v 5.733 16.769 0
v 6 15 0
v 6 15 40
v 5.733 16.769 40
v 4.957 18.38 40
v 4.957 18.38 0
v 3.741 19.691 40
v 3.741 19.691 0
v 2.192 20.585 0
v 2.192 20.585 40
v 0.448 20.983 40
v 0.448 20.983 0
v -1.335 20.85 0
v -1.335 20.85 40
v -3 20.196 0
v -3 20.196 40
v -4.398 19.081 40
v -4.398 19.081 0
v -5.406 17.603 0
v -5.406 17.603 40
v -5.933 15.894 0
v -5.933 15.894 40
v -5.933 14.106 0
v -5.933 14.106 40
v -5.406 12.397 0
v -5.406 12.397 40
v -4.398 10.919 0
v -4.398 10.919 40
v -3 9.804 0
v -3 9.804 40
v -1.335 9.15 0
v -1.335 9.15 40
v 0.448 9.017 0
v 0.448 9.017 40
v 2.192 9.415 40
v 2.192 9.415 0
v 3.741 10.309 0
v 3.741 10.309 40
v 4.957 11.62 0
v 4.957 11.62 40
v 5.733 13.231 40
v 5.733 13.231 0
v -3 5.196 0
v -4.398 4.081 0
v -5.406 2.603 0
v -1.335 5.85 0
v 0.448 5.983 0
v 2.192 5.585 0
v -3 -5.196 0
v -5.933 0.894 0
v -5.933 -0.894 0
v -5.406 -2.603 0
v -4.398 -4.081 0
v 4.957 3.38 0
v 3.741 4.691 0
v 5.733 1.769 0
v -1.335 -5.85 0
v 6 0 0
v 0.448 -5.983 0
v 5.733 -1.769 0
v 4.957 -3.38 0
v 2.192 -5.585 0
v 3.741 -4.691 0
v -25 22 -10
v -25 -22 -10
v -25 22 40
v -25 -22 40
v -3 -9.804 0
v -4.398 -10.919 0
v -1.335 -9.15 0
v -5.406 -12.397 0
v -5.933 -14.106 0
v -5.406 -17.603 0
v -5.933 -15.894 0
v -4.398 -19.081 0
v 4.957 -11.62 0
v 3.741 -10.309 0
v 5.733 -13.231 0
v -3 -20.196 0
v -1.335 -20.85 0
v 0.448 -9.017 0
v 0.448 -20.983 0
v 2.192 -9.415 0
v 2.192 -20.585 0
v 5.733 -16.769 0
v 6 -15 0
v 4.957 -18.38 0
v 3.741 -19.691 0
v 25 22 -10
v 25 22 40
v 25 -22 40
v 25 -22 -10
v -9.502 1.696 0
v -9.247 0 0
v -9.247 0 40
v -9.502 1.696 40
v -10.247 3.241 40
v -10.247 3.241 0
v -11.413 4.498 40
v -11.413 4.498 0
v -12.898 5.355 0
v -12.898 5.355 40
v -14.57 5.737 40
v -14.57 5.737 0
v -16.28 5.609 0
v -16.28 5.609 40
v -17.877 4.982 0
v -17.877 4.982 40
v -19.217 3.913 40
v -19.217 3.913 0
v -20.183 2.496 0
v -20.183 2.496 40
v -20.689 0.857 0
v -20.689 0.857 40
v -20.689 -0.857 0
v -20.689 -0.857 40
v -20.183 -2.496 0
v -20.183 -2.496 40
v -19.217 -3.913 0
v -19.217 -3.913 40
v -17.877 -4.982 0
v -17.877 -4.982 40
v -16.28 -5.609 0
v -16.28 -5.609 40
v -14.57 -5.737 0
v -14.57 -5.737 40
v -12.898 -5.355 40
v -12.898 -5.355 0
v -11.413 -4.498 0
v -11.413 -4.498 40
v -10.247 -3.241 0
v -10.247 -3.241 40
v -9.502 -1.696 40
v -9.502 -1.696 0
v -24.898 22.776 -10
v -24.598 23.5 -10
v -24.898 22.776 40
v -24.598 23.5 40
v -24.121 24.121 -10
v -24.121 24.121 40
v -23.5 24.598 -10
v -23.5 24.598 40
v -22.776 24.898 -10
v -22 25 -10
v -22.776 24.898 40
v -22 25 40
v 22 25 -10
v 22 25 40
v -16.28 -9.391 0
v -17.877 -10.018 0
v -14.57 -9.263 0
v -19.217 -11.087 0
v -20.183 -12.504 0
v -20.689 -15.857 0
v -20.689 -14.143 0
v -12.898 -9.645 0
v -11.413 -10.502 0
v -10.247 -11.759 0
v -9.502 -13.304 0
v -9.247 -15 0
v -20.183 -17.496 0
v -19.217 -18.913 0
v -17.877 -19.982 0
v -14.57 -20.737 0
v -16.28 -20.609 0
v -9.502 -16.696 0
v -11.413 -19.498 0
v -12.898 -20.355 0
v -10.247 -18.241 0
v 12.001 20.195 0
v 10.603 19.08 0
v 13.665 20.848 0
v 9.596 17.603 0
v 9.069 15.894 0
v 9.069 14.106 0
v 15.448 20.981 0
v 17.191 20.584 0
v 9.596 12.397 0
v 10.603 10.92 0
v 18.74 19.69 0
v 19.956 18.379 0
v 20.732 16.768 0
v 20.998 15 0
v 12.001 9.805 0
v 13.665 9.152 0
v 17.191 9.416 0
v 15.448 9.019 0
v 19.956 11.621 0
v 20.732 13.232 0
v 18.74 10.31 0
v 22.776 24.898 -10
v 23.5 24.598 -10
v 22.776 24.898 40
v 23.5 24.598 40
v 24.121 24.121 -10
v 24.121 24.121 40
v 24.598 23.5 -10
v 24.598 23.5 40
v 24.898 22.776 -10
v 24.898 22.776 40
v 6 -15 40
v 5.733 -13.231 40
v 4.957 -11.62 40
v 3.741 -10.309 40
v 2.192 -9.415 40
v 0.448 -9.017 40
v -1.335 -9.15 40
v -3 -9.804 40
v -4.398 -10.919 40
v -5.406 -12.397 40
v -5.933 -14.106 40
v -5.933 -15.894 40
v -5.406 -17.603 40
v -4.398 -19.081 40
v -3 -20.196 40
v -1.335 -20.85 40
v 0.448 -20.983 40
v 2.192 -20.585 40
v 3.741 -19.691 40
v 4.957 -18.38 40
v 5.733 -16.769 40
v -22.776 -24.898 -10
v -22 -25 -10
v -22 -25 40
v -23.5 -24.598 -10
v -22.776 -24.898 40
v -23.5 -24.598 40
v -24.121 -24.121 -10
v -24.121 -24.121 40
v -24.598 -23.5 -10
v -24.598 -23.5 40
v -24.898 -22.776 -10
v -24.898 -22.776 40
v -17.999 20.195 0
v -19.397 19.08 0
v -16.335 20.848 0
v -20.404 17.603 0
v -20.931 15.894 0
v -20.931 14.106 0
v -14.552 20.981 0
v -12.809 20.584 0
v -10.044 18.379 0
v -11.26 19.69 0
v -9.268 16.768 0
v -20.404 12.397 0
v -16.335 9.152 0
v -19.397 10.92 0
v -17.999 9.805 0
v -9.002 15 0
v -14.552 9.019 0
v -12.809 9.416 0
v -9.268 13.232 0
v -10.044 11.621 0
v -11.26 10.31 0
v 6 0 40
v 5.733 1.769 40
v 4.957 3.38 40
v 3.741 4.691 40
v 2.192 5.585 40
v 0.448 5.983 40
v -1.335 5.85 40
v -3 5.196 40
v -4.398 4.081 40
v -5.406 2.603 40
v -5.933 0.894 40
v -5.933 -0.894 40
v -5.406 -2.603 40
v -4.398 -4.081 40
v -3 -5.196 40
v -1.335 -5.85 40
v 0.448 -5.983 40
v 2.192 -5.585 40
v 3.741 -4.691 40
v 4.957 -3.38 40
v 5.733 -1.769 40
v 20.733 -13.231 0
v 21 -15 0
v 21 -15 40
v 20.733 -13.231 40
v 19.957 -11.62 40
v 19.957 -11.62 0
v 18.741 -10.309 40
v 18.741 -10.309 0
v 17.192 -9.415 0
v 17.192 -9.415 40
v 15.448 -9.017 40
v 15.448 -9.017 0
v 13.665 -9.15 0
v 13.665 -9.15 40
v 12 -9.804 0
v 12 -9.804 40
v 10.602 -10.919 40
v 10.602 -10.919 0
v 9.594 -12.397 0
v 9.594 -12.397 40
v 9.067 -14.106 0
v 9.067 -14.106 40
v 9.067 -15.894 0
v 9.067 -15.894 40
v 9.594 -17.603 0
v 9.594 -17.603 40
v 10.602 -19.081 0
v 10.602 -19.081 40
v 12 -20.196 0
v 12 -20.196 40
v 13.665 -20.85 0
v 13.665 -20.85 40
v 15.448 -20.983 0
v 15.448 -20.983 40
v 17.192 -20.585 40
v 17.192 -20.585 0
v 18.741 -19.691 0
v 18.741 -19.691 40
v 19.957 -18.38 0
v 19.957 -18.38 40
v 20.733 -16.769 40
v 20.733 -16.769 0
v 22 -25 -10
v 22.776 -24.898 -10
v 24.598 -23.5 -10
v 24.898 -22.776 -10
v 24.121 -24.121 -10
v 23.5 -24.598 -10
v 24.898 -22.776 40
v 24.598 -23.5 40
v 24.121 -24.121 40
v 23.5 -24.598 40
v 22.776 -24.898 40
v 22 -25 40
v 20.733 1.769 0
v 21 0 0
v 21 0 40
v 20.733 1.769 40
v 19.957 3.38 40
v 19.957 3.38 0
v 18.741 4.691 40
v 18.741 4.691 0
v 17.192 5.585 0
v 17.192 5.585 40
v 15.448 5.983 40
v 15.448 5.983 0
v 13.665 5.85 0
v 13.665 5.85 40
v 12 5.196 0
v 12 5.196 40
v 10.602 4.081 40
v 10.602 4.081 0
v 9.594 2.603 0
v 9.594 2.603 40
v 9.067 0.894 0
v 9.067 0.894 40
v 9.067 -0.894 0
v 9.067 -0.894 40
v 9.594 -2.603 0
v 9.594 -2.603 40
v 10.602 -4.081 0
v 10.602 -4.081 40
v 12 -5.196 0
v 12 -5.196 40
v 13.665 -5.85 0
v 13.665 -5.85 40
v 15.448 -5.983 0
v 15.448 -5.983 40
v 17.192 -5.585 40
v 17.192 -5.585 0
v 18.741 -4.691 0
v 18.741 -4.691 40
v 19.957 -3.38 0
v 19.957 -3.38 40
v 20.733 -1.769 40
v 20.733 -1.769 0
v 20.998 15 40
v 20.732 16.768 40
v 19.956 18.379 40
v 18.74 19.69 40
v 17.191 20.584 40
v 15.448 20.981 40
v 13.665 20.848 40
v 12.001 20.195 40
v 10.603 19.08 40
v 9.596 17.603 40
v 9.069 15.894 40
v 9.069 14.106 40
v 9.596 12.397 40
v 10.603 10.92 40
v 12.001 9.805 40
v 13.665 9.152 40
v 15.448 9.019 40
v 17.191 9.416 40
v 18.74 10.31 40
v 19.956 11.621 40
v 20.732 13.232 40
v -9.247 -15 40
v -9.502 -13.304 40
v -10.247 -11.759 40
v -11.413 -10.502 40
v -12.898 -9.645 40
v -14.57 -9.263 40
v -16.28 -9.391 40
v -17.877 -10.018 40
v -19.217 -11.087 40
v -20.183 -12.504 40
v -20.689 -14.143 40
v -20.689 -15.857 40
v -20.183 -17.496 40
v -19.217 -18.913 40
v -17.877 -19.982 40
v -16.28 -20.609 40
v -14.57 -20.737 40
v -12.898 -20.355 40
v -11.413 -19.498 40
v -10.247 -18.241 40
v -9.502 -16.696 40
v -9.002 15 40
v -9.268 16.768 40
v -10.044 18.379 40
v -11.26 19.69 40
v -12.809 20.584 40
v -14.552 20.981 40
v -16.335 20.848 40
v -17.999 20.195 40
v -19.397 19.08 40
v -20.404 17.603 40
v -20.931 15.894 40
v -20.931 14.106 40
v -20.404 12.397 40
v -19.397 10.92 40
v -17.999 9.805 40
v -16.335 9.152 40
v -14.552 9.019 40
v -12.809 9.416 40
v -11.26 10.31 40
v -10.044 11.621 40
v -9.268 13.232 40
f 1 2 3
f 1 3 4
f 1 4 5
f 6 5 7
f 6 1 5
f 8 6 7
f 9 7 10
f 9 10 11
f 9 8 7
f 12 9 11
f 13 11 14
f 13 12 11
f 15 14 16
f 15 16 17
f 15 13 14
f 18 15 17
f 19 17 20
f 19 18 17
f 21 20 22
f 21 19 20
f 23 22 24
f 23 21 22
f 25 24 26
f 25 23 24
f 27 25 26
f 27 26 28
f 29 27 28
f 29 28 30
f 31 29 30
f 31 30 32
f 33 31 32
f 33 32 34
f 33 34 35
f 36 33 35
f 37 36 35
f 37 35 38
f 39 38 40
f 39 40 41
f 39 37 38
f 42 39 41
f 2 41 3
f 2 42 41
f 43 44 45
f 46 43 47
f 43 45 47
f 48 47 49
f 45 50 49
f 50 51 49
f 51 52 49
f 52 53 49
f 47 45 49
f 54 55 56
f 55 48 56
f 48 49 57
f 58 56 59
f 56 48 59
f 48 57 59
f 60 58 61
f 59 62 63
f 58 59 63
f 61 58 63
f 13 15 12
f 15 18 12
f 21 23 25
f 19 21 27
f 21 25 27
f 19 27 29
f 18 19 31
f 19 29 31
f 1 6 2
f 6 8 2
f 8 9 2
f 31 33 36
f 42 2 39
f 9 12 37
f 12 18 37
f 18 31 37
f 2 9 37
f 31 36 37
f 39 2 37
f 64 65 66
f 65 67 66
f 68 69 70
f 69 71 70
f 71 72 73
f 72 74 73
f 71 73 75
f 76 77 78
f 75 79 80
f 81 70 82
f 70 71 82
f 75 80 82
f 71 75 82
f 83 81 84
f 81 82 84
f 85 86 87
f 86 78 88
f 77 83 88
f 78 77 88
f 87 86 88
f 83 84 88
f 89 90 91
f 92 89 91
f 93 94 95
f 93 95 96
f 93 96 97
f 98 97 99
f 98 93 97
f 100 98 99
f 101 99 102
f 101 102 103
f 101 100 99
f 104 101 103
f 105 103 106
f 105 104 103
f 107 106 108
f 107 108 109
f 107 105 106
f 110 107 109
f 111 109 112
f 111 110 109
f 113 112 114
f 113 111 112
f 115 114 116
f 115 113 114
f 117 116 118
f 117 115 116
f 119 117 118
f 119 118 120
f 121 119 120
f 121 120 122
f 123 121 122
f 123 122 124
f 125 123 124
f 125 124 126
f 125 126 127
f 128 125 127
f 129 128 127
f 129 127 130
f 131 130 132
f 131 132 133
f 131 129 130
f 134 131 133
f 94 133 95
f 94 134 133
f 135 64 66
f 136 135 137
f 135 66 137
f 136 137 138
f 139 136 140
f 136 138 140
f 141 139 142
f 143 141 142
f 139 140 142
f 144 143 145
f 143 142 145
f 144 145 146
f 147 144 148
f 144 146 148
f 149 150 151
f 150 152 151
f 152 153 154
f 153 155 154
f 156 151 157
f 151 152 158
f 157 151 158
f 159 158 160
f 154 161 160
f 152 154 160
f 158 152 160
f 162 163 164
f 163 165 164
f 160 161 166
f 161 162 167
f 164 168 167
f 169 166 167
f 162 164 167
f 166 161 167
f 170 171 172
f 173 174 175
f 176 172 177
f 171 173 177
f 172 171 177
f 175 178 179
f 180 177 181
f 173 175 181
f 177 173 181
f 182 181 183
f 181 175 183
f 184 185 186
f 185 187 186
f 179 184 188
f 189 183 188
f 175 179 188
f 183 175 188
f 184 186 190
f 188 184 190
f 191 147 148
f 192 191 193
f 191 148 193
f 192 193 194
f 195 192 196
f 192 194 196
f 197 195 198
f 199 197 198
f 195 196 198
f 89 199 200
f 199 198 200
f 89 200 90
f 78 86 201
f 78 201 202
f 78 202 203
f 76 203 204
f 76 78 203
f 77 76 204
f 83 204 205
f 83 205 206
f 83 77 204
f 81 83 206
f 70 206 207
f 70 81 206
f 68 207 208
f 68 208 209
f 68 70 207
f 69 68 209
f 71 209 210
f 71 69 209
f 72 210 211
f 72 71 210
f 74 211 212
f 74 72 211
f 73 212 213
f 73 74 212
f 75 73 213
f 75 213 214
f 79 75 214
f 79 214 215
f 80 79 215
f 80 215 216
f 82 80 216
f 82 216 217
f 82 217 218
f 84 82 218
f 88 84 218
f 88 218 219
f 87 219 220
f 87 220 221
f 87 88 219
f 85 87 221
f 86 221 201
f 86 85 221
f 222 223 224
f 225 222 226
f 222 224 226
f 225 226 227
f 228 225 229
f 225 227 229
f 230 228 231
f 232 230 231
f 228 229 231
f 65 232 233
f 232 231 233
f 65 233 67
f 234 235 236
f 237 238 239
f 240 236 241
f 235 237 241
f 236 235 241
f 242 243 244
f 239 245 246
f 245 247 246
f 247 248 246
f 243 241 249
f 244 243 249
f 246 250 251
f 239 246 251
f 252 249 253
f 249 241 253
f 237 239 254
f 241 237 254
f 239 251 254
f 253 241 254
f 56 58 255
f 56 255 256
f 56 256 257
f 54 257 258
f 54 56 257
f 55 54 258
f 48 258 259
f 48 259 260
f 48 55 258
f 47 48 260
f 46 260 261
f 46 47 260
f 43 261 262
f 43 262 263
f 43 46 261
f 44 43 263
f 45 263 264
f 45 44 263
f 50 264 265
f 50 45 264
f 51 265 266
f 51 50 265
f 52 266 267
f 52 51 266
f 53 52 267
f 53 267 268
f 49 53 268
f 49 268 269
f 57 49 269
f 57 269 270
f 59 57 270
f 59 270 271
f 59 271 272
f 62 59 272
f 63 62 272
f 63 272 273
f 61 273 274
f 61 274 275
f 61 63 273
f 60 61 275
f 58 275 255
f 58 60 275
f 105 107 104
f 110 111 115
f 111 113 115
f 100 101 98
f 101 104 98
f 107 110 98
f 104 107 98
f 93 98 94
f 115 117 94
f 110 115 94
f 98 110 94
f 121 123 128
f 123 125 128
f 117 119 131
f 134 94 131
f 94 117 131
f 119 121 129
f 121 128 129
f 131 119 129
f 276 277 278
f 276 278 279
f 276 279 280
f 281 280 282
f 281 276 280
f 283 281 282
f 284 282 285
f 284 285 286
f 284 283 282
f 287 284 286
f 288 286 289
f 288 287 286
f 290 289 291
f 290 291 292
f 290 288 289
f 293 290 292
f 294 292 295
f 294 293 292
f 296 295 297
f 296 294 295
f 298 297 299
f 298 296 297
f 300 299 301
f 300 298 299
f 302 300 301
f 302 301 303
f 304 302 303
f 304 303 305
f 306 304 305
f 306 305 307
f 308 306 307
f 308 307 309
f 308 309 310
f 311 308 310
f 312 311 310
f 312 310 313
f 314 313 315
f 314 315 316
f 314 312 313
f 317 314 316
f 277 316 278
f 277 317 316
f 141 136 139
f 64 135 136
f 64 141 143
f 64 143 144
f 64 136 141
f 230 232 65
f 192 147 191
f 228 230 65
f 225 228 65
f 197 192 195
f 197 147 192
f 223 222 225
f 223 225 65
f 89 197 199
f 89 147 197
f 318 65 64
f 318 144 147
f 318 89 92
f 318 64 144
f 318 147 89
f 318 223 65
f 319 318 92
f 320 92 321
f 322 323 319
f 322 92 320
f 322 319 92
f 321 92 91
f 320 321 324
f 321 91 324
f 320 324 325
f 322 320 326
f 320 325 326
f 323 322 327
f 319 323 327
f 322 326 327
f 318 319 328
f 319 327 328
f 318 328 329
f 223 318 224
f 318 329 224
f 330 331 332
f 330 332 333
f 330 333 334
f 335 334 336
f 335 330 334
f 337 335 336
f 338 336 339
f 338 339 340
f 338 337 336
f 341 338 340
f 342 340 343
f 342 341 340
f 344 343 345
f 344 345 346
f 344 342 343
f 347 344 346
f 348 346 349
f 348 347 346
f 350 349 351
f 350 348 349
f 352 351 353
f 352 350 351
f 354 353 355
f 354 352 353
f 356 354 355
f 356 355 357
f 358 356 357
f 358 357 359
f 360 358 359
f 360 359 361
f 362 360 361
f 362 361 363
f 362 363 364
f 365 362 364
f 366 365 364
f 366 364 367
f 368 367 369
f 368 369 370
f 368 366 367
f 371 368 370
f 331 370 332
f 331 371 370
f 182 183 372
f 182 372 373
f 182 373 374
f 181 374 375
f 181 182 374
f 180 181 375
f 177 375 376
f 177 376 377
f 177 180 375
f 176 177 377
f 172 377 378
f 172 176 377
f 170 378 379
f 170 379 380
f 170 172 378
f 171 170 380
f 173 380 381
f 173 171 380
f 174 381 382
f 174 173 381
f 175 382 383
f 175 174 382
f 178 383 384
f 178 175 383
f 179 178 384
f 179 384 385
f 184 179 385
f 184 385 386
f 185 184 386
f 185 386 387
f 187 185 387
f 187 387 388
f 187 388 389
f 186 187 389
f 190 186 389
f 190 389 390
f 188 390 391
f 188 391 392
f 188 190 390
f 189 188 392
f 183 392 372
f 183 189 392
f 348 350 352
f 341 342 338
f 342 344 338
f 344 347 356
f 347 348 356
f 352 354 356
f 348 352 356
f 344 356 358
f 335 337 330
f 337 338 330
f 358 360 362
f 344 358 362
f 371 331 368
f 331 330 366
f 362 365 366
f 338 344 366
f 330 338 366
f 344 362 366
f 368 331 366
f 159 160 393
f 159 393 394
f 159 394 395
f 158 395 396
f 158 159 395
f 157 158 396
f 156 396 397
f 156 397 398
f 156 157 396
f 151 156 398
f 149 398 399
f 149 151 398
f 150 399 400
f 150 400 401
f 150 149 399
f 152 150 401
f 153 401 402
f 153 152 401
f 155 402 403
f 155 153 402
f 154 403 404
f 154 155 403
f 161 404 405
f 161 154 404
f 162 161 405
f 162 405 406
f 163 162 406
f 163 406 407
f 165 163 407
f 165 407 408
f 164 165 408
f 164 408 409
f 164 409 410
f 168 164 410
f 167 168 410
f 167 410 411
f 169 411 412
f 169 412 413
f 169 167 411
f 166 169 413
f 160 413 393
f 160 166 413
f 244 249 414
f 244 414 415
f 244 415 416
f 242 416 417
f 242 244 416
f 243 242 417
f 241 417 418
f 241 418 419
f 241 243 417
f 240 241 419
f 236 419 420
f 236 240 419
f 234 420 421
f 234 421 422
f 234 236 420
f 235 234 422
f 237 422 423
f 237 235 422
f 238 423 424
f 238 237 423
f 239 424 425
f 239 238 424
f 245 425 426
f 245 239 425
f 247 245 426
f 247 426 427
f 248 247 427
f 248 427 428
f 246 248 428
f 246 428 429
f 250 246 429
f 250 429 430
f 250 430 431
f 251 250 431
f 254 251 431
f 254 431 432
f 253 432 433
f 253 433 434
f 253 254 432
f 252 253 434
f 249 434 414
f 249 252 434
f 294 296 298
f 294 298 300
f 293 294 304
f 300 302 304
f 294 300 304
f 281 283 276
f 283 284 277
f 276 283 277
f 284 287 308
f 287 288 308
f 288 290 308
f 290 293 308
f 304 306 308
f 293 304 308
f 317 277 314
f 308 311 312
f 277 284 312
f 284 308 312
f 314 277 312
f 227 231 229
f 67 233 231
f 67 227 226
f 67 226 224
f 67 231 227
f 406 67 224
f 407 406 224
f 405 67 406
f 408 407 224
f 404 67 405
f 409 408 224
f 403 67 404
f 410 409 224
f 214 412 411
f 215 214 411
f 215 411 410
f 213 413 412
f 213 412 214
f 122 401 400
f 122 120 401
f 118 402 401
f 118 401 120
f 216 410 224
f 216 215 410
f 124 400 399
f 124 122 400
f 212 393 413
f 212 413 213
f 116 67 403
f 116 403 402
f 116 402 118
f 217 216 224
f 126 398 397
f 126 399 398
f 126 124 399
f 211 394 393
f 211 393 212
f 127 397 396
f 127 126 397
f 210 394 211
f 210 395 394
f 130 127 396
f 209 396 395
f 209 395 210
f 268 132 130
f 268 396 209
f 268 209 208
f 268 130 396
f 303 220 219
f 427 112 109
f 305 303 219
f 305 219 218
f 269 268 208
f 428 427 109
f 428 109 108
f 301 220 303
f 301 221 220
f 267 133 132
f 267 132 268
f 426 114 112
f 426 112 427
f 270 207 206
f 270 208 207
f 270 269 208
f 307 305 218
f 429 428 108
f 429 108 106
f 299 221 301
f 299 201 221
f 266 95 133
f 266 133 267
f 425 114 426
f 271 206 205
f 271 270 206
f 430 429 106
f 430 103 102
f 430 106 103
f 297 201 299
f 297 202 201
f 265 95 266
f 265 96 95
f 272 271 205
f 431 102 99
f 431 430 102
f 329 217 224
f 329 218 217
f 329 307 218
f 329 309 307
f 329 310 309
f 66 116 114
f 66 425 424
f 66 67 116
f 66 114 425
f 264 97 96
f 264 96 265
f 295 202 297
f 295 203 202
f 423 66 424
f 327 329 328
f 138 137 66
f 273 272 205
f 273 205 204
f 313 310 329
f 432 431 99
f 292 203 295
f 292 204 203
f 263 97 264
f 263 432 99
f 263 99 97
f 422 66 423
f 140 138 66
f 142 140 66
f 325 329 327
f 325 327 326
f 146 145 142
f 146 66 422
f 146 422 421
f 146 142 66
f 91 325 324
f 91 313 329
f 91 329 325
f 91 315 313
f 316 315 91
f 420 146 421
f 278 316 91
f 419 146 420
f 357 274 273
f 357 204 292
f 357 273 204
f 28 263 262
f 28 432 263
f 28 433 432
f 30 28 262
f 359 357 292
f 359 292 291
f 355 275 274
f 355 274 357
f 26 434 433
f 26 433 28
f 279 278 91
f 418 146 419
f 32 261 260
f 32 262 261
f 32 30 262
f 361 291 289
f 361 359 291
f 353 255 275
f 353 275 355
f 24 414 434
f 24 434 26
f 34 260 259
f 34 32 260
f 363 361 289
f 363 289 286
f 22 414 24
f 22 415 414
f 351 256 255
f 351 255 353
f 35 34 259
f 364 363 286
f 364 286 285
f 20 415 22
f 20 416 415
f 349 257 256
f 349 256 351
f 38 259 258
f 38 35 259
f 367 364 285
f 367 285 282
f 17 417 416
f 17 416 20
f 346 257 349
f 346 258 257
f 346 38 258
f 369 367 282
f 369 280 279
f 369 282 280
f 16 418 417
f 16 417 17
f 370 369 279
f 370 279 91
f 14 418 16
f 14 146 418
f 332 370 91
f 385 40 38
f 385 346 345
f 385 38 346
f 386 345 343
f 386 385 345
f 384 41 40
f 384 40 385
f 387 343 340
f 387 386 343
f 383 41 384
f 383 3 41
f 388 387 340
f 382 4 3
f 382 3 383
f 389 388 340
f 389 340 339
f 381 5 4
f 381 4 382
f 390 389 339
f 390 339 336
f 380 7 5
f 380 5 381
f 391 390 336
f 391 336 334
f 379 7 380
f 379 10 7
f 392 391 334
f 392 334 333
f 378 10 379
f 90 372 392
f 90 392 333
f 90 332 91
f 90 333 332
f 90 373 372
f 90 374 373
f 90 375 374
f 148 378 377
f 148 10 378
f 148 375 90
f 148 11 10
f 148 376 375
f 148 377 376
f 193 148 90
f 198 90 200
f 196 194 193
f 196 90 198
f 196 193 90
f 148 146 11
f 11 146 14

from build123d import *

# Parameters (mm, degrees)
F0_R     = 5.753175
F0_R_2   = 6
F0_R_3   = 5.998256
F1_DEPTH = 40
F3_DEPTH = 10


with BuildPart() as f1:
    # F0 (on Top) → F1 (new body)
    with BuildSketch(Plane.XY):
        with BuildLine():
            ThreePointArc((25, 22), (24.12132, 24.12132), (22, 25))
            Line((22, 25), (-22, 25))
            ThreePointArc((-22, 25), (-24.12132, 24.12132), (-25, 22))
            Line((-25, 22), (-25, -22))
            ThreePointArc((-25, -22), (-24.12132, -24.12132), (-22, -25))
            Line((-22, -25), (22, -25))
            ThreePointArc((22, -25), (24.12132, -24.12132), (25, -22))
            Line((25, -22), (25, 22))
        make_face()
        with Locations((-15, -15)):
            Circle(F0_R, mode=Mode.SUBTRACT)
        with Locations((0, -15)):
            Circle(F0_R_2, mode=Mode.SUBTRACT)
        with Locations((15, -15)):
            Circle(F0_R_2, mode=Mode.SUBTRACT)
        with Locations((-15, 0)):
            Circle(F0_R, mode=Mode.SUBTRACT)
        with Locations((-15, 15)):
            Circle(F0_R_3, mode=Mode.SUBTRACT)
        Circle(F0_R_2, mode=Mode.SUBTRACT)
        with Locations((15, 0)):
            Circle(F0_R_2, mode=Mode.SUBTRACT)
        with Locations((0, 15)):
            Circle(F0_R_2, mode=Mode.SUBTRACT)
        with Locations((15, 15)):
            Circle(F0_R_3, mode=Mode.SUBTRACT)
    extrude(amount=F1_DEPTH)

    # F2 (on face) → F3 (join)
    with BuildSketch(Plane(origin=(0, 0, 0), x_dir=(1, 0, 0), z_dir=(0, 0, -1))):
        with BuildLine():
            ThreePointArc((25, 22), (24.12132, 24.12132), (22, 25))
            Line((22, 25), (-22, 25))
            ThreePointArc((-22, 25), (-24.12132, 24.12132), (-25, 22))
            Line((-25, 22), (-25, -22))
            ThreePointArc((-25, -22), (-24.12132, -24.12132), (-22, -25))
            Line((-22, -25), (22, -25))
            ThreePointArc((22, -25), (24.12132, -24.12132), (25, -22))
            Line((25, -22), (25, 22))
        make_face()
    extrude(amount=F3_DEPTH)


solid = f1.part
